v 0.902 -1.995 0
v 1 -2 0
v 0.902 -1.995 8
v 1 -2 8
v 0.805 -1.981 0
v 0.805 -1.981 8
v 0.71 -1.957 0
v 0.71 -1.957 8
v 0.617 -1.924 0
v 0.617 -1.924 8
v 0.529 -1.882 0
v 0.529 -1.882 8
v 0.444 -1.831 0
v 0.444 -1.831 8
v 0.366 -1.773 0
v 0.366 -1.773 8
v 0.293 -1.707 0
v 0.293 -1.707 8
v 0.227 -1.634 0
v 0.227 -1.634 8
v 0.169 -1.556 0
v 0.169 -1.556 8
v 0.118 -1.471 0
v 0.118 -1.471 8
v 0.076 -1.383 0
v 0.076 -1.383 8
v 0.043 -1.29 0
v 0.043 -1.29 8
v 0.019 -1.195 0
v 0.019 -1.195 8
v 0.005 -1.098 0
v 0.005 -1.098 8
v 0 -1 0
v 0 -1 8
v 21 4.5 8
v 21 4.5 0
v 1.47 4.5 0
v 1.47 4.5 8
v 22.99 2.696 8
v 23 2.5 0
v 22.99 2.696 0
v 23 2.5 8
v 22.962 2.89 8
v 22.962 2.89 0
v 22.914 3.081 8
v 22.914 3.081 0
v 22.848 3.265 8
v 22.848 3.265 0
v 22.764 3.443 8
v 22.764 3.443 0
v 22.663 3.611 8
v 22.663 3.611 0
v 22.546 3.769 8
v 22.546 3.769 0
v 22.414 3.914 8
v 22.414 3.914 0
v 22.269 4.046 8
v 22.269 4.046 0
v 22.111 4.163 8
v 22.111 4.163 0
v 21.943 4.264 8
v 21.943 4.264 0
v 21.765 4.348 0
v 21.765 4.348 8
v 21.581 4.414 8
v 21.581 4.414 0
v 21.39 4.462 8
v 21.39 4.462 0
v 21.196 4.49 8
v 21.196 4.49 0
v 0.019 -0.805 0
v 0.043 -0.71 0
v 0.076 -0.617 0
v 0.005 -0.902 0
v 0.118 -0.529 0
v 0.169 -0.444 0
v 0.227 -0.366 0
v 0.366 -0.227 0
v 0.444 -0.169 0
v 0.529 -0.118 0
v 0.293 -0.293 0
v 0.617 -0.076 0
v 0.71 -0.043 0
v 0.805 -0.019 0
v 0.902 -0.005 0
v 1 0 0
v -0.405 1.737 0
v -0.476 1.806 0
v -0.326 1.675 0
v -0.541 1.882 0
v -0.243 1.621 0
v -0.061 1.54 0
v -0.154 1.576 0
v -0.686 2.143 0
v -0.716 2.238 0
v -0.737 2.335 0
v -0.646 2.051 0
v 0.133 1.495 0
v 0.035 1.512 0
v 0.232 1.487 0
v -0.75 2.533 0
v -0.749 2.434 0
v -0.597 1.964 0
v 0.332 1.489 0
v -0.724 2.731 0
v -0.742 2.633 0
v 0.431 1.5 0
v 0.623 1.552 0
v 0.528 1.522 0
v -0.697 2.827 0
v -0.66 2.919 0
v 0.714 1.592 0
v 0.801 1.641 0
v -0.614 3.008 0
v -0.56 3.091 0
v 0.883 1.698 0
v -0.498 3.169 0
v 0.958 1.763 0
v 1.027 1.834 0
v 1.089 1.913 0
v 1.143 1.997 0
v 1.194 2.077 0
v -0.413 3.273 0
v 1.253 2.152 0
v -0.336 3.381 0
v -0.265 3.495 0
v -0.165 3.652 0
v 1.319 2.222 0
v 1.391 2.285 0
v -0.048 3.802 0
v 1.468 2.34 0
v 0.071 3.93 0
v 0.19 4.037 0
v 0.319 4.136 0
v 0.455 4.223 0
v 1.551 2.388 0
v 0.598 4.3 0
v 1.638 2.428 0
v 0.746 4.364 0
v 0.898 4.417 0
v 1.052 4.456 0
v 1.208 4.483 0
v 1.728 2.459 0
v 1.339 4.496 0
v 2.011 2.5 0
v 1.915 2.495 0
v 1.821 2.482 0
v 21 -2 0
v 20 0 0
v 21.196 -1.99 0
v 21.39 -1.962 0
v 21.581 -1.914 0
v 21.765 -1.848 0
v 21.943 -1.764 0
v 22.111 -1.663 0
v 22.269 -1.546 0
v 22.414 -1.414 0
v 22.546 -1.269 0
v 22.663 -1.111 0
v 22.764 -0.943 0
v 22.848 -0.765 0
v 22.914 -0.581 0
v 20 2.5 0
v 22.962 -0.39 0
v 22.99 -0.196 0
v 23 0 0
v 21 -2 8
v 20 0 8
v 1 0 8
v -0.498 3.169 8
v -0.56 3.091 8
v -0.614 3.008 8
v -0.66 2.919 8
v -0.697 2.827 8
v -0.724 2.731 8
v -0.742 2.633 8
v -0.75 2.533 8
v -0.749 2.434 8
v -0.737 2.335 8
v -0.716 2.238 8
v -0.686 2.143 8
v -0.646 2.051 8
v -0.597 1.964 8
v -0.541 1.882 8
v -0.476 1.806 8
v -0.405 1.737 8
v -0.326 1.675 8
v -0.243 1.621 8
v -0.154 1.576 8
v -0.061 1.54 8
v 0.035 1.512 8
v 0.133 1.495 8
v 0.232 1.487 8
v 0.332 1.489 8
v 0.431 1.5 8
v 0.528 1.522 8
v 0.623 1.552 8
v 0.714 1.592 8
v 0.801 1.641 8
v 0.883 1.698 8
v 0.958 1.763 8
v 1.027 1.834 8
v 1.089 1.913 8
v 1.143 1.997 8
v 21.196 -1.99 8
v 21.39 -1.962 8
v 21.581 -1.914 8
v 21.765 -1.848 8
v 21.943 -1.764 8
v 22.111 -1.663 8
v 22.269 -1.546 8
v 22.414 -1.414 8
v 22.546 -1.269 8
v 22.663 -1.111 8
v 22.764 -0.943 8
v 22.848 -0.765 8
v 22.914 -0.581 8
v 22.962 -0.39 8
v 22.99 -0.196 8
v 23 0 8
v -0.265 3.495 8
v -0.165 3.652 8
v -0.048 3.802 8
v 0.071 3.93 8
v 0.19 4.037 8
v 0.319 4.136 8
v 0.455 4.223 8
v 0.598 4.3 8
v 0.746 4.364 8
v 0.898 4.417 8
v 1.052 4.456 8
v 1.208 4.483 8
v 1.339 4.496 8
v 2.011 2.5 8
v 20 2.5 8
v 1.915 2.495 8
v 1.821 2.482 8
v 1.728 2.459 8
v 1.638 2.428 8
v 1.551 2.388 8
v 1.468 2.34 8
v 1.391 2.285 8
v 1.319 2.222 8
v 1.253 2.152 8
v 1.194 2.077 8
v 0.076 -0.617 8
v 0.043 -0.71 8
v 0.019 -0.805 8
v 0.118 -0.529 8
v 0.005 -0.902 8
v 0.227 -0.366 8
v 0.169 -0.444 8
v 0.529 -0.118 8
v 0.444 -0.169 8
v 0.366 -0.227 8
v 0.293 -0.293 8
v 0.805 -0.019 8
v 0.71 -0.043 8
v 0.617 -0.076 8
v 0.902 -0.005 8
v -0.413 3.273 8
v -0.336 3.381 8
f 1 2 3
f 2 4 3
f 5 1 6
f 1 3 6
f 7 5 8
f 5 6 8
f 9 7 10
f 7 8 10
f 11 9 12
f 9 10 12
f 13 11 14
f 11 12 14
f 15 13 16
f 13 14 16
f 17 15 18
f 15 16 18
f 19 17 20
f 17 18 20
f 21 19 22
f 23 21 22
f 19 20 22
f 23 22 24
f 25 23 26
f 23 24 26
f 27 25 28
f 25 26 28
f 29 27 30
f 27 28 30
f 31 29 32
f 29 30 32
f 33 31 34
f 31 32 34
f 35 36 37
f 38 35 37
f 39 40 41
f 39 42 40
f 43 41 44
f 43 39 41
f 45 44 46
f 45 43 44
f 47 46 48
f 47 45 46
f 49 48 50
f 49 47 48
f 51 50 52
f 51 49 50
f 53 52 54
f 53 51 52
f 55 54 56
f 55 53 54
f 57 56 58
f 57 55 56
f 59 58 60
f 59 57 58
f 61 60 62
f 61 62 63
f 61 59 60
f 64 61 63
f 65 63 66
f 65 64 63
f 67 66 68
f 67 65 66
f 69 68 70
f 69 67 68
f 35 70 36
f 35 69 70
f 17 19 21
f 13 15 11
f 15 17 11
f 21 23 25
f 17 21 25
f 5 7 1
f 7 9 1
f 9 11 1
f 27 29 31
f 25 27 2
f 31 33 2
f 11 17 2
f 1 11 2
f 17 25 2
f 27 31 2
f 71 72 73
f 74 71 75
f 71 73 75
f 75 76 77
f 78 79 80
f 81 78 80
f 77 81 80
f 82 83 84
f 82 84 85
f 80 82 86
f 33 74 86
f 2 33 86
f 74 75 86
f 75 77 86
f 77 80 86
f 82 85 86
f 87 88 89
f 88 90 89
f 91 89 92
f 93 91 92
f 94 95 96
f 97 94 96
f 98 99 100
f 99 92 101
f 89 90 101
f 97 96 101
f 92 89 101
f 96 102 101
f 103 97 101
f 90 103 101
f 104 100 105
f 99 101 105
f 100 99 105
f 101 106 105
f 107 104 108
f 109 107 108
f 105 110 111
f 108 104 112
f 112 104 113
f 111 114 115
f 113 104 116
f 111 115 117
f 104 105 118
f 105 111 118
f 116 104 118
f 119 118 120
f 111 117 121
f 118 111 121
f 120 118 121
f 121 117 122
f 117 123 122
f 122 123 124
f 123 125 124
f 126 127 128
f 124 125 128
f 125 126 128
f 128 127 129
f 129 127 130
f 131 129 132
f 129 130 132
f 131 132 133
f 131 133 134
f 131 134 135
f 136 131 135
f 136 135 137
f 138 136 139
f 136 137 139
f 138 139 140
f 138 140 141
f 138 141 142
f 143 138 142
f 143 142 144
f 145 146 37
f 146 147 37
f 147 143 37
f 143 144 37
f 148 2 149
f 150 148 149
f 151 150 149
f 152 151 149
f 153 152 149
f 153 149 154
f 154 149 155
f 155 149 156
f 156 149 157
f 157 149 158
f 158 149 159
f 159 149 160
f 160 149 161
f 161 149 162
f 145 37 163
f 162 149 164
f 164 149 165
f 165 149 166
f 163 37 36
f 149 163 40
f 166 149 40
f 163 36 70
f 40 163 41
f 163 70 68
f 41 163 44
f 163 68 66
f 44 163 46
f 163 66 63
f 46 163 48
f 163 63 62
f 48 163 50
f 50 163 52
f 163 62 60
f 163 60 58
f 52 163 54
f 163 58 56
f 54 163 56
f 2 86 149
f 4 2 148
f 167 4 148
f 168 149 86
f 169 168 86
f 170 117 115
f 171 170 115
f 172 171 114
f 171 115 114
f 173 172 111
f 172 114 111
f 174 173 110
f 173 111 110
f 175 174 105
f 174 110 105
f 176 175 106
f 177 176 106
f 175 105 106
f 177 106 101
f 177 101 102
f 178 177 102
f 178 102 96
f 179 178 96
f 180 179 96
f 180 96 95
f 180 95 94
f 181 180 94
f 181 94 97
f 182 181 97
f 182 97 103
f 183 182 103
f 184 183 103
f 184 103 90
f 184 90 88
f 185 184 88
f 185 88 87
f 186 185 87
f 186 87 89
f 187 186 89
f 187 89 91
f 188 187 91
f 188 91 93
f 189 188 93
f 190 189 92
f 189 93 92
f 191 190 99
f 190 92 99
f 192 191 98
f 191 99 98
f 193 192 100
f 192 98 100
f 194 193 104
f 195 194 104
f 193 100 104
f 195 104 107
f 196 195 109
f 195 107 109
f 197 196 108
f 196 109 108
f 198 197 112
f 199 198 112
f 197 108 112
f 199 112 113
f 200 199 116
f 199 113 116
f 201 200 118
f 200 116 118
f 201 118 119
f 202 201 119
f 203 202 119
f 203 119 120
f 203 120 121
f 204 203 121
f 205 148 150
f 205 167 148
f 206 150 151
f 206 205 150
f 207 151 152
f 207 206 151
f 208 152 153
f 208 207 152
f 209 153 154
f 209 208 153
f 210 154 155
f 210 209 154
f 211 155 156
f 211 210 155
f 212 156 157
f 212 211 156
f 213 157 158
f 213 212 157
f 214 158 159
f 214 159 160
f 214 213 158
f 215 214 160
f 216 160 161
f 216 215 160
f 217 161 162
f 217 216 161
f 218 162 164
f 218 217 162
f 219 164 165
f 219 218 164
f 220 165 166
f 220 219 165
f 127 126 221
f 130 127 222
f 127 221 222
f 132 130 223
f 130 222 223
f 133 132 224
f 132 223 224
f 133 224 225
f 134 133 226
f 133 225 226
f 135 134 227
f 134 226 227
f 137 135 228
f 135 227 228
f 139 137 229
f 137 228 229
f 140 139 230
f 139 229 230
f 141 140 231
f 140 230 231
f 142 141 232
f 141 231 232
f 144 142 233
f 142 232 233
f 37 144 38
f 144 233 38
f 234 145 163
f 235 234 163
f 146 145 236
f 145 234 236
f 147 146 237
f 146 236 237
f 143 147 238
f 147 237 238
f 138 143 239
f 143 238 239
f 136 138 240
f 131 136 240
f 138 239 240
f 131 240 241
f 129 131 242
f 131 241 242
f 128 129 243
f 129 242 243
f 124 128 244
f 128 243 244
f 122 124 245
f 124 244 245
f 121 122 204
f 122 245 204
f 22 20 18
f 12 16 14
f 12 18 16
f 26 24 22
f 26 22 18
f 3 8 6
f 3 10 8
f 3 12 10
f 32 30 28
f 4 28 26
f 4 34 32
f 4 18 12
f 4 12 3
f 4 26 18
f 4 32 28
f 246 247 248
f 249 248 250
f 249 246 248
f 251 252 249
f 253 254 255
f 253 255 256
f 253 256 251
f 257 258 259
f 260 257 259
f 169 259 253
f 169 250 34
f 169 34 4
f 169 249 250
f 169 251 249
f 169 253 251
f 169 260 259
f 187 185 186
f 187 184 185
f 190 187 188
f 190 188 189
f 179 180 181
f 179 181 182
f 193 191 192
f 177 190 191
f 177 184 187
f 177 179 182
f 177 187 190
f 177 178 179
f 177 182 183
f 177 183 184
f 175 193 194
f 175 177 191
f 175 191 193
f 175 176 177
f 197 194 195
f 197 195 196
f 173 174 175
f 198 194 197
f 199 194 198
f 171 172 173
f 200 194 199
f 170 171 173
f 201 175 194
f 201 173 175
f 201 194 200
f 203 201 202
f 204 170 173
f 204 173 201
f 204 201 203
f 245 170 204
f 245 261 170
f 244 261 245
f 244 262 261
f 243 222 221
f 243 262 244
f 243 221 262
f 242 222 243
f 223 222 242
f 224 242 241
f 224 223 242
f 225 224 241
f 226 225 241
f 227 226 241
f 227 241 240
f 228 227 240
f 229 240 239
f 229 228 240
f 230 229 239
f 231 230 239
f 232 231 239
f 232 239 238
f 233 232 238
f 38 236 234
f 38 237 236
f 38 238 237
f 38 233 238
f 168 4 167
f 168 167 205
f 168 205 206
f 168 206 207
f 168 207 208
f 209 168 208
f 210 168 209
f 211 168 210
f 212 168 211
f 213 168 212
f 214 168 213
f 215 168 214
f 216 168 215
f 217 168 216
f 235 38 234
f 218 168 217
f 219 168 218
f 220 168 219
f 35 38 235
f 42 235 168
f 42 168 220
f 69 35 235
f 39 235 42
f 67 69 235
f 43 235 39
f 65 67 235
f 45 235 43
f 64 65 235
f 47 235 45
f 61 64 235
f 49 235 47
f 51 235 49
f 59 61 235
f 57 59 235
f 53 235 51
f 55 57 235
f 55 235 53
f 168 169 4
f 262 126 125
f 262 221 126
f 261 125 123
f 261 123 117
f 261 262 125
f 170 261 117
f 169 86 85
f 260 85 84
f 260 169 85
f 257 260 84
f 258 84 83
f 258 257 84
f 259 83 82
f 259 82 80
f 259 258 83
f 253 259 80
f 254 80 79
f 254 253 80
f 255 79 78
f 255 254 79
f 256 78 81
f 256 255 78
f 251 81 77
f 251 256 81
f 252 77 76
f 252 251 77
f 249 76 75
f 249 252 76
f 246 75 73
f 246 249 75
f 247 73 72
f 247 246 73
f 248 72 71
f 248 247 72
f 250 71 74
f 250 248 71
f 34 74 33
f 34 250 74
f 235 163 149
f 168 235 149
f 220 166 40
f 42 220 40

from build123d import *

# Parameters (mm, degrees)
F1_DEPTH = 8
F2_R     = 2
F3_R     = 1
F4_R     = 2
F5_R     = 0.99999


# Not quite as in the source:
# - a fillet or chamfer is up to 0.001 mm smaller than in the source, because OpenCascade refuses the exact size


with BuildPart() as f1:
    # F0 (on Top) → F1 (new body)
    with BuildSketch(Plane.XY):
        with BuildLine():
            Line((20, 0), (0, 0))
            Line((0, 0), (0, -2))
            Line((0, -2), (23, -2))
            Line((23, -2), (23, 4.5))
            Line((23, 4.5), (0, 4.5))
            Line((0, 4.5), (0, 3.478939205))
            ThreePointArc((0, 3.478939205), (-0.3538557851, 1.6956316782), (1.2766015908, 2.5))
            Line((1.2766015908, 2.5), (20, 2.5))
            Line((20, 2.5), (20, 0))
        make_face()
    extrude(amount=F1_DEPTH)

    # F2
    f2_edges = [f1.edges().sort_by_distance(p)[0] for p in [
        (23, -2, 4),
        (23, 4.5, 4),
        (0, 3.478939, 4),
    ]]
    fillet(f2_edges, radius=F2_R)

    # F3
    f3_edges = [f1.edges().sort_by_distance(p)[0] for p in [
        (1.276602, 2.5, 4),
    ]]
    fillet(f3_edges, radius=F3_R)

    # F4
    f4_edges = [f1.edges().sort_by_distance(p)[0] for p in [
        (0, 4.5, 4),
    ]]
    fillet(f4_edges, radius=F4_R)

    # F5 (radius 1 in the source; OpenCascade refuses exactly that, so slightly less here)
    f5_edges = [f1.edges().sort_by_distance(p)[0] for p in [
        (0, 0, 4),
        (0, -2, 4),
    ]]
    fillet(f5_edges, radius=F5_R)


solid = f1.part
